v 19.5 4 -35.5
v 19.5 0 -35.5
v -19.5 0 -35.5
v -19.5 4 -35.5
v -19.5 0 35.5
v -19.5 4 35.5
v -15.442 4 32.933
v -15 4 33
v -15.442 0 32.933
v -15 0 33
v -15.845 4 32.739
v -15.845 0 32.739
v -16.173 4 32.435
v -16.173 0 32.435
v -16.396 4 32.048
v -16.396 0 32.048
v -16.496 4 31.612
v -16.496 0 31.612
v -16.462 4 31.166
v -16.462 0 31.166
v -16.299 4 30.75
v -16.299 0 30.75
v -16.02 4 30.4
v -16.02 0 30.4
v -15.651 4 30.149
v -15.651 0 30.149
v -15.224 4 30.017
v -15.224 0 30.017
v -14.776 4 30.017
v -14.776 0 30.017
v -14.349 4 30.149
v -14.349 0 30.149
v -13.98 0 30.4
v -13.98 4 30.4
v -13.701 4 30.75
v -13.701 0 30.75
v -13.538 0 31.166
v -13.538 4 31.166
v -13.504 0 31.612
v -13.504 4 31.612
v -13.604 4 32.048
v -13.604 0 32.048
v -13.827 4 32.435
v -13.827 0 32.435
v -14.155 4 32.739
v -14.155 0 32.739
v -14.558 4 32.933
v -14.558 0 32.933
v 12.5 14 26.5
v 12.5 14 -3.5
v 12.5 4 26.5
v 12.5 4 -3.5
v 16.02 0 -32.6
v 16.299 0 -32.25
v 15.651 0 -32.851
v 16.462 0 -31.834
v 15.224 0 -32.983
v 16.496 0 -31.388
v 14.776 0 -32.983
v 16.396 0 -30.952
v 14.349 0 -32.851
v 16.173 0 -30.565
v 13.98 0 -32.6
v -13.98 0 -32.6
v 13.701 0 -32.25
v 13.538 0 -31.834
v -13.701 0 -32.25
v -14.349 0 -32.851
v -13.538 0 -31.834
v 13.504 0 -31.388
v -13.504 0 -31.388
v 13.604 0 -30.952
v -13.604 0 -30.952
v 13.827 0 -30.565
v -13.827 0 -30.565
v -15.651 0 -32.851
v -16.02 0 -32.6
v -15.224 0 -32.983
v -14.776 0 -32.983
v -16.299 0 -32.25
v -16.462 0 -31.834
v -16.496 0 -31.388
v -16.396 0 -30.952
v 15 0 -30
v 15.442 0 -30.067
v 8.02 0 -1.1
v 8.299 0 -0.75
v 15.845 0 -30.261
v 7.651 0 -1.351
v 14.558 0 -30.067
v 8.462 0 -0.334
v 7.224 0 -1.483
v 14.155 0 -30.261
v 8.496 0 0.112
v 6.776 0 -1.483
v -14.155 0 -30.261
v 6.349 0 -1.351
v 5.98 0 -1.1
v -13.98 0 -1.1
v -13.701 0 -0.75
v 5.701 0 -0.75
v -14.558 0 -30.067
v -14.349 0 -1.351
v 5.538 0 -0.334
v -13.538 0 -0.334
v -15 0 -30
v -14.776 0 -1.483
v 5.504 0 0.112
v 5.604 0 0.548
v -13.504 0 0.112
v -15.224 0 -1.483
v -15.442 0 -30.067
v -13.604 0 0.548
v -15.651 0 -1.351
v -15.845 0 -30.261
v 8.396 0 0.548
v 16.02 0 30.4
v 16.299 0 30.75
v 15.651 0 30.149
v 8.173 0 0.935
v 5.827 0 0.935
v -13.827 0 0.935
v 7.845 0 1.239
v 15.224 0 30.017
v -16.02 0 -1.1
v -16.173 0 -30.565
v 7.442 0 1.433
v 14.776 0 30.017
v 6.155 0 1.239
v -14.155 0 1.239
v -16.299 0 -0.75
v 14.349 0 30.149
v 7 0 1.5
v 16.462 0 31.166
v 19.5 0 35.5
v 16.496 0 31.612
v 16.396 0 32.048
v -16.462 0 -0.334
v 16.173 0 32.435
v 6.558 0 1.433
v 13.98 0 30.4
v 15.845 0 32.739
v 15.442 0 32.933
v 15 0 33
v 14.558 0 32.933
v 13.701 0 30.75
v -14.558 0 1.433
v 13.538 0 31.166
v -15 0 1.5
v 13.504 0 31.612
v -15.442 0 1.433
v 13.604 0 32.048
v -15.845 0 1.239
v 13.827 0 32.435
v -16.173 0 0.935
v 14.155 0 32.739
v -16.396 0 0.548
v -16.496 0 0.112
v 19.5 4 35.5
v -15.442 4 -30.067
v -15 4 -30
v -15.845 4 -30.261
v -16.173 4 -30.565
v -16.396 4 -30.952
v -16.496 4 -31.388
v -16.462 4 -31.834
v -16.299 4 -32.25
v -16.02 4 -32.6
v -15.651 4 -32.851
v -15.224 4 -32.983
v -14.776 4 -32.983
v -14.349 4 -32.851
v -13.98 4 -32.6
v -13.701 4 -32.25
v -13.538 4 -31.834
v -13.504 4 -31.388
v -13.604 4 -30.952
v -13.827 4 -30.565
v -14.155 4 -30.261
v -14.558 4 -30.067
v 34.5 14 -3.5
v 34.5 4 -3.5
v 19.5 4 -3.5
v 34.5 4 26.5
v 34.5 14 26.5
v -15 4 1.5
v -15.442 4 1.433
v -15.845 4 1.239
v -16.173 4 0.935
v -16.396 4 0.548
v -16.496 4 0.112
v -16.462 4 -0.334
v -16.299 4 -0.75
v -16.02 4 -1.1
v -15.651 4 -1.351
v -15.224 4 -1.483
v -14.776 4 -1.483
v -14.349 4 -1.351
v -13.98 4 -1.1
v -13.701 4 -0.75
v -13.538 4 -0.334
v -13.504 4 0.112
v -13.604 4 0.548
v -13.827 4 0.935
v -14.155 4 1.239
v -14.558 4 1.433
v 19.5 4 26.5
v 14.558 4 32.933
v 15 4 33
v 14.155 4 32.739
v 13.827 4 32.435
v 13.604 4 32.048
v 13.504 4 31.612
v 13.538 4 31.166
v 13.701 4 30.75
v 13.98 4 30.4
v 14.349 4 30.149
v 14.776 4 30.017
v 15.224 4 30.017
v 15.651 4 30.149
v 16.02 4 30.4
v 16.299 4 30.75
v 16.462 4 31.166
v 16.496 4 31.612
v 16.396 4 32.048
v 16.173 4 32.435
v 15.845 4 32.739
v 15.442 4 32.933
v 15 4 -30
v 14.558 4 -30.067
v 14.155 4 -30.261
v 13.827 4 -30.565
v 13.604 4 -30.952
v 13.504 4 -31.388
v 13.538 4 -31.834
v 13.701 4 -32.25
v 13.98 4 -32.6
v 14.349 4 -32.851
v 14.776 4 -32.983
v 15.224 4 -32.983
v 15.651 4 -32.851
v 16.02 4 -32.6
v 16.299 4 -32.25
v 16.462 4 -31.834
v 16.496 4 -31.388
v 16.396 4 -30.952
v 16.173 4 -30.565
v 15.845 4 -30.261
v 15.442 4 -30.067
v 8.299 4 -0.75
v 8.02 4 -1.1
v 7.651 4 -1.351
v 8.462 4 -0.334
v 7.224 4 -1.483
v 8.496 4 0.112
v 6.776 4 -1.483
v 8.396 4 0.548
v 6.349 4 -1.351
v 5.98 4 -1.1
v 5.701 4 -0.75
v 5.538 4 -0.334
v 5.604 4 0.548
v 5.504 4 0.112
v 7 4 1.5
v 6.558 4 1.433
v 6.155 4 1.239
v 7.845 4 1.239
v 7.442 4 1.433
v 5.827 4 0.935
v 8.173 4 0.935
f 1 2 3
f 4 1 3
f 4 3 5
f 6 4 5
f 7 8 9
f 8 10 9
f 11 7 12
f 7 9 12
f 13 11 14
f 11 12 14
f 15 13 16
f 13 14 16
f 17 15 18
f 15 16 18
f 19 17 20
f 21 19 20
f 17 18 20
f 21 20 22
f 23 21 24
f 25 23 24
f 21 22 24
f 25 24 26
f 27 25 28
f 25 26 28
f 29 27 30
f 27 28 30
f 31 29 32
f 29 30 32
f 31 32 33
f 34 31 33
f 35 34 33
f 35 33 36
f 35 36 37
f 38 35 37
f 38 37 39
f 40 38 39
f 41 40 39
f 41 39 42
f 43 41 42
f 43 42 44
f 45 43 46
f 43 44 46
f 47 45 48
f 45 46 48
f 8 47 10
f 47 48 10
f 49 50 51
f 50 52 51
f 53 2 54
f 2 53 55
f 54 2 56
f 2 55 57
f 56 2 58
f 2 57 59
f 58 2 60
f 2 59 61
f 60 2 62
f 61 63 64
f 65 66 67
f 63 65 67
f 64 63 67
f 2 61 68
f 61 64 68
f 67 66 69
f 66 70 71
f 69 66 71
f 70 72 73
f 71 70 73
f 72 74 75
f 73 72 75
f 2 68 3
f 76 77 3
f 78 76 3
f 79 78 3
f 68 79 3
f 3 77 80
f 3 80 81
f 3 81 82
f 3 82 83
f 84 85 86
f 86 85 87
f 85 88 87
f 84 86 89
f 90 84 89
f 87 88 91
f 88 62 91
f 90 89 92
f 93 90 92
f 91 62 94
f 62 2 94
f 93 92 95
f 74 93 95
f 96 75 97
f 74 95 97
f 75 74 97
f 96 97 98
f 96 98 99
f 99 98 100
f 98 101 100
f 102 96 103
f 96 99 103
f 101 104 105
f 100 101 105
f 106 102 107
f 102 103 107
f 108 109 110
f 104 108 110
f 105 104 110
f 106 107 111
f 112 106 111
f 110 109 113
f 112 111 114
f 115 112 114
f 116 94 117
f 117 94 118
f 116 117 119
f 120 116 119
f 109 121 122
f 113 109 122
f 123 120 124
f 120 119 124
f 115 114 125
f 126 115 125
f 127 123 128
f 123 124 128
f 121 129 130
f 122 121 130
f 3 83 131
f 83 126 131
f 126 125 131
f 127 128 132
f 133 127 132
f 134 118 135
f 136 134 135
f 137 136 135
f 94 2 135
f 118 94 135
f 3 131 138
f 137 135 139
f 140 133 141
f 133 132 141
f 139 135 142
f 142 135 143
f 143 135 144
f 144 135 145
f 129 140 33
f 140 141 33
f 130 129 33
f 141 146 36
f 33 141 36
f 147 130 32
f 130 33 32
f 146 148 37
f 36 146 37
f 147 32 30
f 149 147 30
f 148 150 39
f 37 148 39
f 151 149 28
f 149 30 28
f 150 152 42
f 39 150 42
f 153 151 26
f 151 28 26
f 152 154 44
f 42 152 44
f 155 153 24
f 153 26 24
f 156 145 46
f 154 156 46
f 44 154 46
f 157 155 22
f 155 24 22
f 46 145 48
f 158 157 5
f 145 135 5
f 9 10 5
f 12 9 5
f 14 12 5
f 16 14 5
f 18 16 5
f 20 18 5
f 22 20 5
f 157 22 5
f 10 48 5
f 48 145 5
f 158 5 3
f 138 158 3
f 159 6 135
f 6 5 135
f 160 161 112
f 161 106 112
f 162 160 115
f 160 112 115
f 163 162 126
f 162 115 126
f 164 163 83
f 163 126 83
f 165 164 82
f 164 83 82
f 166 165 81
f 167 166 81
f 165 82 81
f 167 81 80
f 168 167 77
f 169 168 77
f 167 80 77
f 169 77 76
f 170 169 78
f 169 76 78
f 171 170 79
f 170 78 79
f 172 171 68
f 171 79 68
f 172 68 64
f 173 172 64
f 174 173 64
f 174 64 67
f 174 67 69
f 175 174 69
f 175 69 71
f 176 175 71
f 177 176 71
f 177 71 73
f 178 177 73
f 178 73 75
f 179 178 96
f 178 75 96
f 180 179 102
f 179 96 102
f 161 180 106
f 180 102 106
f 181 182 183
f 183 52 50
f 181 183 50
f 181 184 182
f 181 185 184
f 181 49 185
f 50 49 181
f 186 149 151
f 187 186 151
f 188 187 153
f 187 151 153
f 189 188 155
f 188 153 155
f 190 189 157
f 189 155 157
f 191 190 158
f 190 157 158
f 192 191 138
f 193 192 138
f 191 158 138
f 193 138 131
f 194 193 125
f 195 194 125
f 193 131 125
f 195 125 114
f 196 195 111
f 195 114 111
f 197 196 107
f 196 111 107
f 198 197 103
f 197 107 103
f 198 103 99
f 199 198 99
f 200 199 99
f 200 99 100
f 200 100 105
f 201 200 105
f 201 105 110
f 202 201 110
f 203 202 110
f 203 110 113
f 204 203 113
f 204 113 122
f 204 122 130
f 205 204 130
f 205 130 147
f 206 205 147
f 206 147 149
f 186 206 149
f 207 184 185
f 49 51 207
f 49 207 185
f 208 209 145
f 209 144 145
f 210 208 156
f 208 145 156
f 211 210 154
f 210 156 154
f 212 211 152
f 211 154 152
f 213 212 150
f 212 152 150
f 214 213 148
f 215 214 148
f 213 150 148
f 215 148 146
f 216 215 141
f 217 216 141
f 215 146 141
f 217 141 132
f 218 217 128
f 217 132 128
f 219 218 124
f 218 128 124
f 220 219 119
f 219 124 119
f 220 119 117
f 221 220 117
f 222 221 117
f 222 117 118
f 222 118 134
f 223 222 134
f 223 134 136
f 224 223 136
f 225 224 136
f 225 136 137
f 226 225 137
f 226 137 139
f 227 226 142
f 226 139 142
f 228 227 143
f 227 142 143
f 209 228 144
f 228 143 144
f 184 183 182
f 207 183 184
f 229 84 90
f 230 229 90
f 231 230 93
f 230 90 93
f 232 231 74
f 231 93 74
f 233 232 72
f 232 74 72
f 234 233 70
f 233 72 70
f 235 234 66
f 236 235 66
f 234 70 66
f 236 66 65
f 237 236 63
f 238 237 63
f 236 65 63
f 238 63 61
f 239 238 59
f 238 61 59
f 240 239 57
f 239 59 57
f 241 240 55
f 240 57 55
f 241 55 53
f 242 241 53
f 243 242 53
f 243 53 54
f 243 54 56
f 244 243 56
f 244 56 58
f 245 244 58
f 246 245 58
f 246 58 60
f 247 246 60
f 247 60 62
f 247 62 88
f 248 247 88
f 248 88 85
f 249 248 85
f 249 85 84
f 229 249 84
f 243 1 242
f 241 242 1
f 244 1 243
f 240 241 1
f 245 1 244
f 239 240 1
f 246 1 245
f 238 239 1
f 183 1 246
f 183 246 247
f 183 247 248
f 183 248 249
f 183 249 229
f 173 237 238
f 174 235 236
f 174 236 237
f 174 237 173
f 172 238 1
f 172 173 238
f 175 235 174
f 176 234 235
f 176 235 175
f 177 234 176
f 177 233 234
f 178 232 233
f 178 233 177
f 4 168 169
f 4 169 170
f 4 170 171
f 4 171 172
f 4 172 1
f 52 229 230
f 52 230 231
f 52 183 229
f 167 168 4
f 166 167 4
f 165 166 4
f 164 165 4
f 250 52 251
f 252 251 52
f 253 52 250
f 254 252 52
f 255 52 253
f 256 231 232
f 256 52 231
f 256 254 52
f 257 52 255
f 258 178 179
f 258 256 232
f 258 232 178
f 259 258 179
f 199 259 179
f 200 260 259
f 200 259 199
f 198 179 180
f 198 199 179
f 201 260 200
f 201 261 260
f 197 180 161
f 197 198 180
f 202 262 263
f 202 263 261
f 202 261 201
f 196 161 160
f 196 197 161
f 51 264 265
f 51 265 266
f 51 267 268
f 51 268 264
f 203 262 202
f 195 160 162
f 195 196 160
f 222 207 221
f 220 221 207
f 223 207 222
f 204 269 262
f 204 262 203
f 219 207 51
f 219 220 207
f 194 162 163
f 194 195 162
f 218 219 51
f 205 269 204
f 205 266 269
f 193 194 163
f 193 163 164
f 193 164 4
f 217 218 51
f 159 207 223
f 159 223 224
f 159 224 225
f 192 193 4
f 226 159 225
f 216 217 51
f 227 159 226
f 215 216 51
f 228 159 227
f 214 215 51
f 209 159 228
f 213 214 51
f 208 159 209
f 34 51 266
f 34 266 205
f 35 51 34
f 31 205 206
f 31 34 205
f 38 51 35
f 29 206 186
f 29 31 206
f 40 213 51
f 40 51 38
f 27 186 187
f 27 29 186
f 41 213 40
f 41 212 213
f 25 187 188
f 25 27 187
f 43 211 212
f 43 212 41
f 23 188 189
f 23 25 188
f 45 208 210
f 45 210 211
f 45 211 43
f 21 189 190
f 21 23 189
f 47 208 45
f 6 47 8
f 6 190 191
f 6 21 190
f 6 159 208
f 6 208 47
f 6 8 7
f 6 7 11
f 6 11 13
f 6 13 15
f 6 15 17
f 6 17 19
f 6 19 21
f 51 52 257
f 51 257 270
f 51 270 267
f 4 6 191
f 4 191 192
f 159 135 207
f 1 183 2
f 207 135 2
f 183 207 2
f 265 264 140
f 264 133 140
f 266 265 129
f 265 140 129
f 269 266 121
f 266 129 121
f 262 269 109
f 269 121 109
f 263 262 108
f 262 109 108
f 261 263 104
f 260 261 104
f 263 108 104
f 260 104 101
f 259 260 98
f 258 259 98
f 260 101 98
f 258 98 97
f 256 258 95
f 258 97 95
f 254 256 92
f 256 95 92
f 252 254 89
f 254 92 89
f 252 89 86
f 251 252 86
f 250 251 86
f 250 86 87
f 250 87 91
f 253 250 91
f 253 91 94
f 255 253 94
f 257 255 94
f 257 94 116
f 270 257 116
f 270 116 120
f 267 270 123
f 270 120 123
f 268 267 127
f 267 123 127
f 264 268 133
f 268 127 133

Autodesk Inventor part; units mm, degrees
ref_plane "YZ Plane" through (0, 0, 0) normal (1, 0, 0) x (0, 1, 0)
ref_plane "XZ Plane" through (0, 0, 0) normal (0, 1, 0) x (-1, 0, 0)
ref_plane "XY Plane" through (0, 0, 0) normal (0, 0, 1) x (1, 0, 0)
sketch "Szkic1" plane through (0, 0, 0) normal (0, 1, 0) x (-1, 0, 0)
  line L0 (-19.5, -35.5) -> (19.5, -35.5)
  line L1 (19.5, -35.5) -> (19.5, 35.5)
  line L2 (19.5, 35.5) -> (-19.5, 35.5)
  line L3 (-19.5, 35.5) -> (-19.5, -35.5)
  line L4 (-19.5, -35.5) -> (19.5, 35.5) construction
  line L5 (19.5, -35.5) -> (-19.5, 35.5) construction
  point P0 (0, 0)
  dimension "d0" = 39
  dimension "d1" = 71
extrude "Wyciągnięcie proste1" add sketch "Szkic1" along normal blind 4
sketch "Szkic2" plane through (0, 4, 0) normal (0, 1, 0) x (1, 0, 0)
  line L0 (19.5, 35.5) -> (-19.5, 35.5) projected
  line L1 (-19.5, 35.5) -> (-19.5, -35.5) projected
  line L2 (-19.5, -35.5) -> (19.5, -35.5) projected
  line L3 (19.5, -35.5) -> (19.5, 35.5) projected
  point P0 (0, 0)
  point P1 (-15, -31.5)
  point P2 (-15, 31.5)
  point P3 (15, 31.5)
  point P4 (15, -31.5)
  point P5 (-15, 0)
  point P6 (7, 0)
  dimension "d4" = 4
  dimension "d5" = 4.5
  dimension "d6" = 63
  dimension "d7" = 63
  dimension "d8" = 71
  dimension "d9" = 4
  dimension "d10" = 30
  dimension "d11" = 39
  dimension "d12" = 30
  dimension "d13" = 4.5
  dimension "d29" = 4.5
  dimension "d30" = 31.5
  dimension "d31" = 22
hole "Otwór1" at (-15, 4, 31.5) at (-15, 4, -31.5) at (15, 4, -31.5) at (15, 4, 31.5) at (7, 4, 0) at (-15, 4, 0) direction (0, -1, 0) diameter 3 end through all
sketch "Szkic3" plane through (0, 4, 0) normal (0, 1, 0) x (1, 0, 0)
  circle A0 centre (15, 31.5) radius 1.5 projected
  circle A1 centre (-15, -31.5) radius 1.5 projected
  circle A2 centre (-15, 31.5) radius 1.5 projected
  circle A3 centre (15, -31.5) radius 1.5 projected
  line L0 (19.5, 35.5) -> (-19.5, 35.5) projected
  line L1 (-19.5, 35.5) -> (-19.5, -35.5) projected
  line L2 (-19.5, -35.5) -> (19.5, -35.5) projected
  line L3 (19.5, -35.5) -> (19.5, 35.5) projected
  line L4 (12.5, -26.5) -> (19.5, -26.5)
  line L5 (19.5, -26.5) -> (19.5, 3.5)
  line L6 (19.5, 3.5) -> (12.5, 3.5)
  line L7 (12.5, 3.5) -> (12.5, -26.5)
  point P0 (0, 0)
  dimension "d21" = 7
  dimension "d22" = 30
  dimension "d23" = 0
  dimension "d24" = 9
extrude "Wyciągnięcie proste2" add sketch "Szkic3" along normal blind 10 contours L3 L4 L7 L6
sketch "Szkic4" plane through (19.5, 0, 35.5) normal (1, 0, 0) x (0, 0, -1)
  line L0 (0, 0) -> (71, 0) projected
  line L1 (71, 0) -> (71, 4) projected
  line L2 (39, 4) -> (71, 4) projected
  line L3 (39, 4) -> (39, 14) projected
  line L4 (9, 14) -> (39, 14) projected
  line L5 (9, 4) -> (9, 14) projected
  line L6 (0, 4) -> (9, 4) projected
  line L7 (0, 0) -> (0, 4) projected
  line L8 (9, 14) -> (39, 14)
  line L9 (39, 14) -> (39, 4)
  line L10 (39, 4) -> (9, 4)
  line L11 (9, 4) -> (9, 14)
  point P0 (35.5, 0)
extrude "Wyciągnięcie proste3" add sketch "Szkic4" along normal blind 15 contours L5 L4 L3 L10
equation "\"d4\" = d9"
equation "\"d5\" = -0.5 * d10 + 0.5 * d11"
equation "\"d9\" = -0.5 * d7 + 0.5 * d8"
equation "\"d12\" = d10"
equation "\"d13\" = d5"
equation "\"d29\" = d13"
equation "\"d30\" = 0.5 * d6"
properties part number "MostekH"
